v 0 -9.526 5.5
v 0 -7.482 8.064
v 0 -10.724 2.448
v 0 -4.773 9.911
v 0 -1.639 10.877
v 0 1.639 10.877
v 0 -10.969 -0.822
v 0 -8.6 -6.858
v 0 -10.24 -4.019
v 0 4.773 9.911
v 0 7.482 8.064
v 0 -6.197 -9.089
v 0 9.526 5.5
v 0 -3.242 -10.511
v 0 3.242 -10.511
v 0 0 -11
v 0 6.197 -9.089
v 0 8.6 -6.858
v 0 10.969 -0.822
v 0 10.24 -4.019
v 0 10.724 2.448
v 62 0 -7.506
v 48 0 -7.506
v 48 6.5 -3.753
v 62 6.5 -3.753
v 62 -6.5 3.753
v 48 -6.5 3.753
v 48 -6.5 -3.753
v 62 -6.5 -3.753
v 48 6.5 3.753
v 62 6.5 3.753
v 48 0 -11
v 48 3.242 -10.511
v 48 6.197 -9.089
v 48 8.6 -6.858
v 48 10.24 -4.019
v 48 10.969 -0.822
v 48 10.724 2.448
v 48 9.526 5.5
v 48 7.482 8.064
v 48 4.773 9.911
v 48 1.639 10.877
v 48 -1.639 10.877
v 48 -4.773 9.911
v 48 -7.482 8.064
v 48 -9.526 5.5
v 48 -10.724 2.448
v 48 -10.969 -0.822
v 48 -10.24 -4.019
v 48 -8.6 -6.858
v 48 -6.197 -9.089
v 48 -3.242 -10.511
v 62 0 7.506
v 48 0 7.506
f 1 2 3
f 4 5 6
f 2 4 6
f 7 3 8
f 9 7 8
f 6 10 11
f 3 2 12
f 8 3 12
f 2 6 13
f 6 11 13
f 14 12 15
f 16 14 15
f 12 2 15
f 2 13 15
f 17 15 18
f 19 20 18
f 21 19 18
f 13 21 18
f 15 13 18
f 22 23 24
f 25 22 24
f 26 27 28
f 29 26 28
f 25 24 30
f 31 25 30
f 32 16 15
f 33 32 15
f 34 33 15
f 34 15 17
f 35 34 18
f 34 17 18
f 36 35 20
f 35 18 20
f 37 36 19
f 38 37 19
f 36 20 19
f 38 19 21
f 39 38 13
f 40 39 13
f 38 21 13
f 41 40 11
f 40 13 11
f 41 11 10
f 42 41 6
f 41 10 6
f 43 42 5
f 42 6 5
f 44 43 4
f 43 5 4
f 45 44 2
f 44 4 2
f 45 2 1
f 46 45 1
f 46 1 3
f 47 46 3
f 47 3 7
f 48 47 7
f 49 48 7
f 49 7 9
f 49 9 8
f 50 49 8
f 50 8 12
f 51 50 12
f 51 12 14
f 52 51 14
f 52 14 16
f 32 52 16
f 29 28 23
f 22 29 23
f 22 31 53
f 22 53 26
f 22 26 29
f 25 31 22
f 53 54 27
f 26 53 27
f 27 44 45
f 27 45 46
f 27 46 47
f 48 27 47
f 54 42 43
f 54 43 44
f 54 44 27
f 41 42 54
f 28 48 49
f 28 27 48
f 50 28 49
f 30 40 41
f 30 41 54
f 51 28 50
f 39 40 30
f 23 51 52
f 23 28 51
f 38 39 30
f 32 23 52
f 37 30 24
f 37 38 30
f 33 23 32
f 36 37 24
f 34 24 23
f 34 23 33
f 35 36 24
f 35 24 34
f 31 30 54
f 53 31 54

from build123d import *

# Parameters (mm, degrees)
ESBO_O1_R                = 11
RESSALTO_EXTRUS_O1_DEPTH = 62
CORTE_EXTRUS_O1_START    = -14
ESBO_O2_R                = 11
CORTE_EXTRUS_O1_DEPTH    = 14


with BuildPart() as part:
    # Esboço1 → Ressalto-extrusão1 (new body)
    with BuildSketch(Plane.YZ):
        with Locations(Location((0, 0, 0), (0, 0, 270))):
            Circle(ESBO_O1_R)
    extrude(amount=RESSALTO_EXTRUS_O1_DEPTH)

    # Esboço2 → Corte-extrusão1 (cut)
    with BuildSketch(Plane.YZ.offset(62).offset(CORTE_EXTRUS_O1_START)):
        with Locations(Location((0, 0, 0), (0, 0, 270))):
            Circle(ESBO_O2_R)
        Polygon((0, 7.505553499), (-6.5, 3.75277675), (-6.5, -3.75277675), (0, -7.505553499), (6.5, -3.75277675), (6.5, 3.75277675), align=None, mode=Mode.SUBTRACT)
    extrude(amount=CORTE_EXTRUS_O1_DEPTH, mode=Mode.SUBTRACT)


solid = part.part
